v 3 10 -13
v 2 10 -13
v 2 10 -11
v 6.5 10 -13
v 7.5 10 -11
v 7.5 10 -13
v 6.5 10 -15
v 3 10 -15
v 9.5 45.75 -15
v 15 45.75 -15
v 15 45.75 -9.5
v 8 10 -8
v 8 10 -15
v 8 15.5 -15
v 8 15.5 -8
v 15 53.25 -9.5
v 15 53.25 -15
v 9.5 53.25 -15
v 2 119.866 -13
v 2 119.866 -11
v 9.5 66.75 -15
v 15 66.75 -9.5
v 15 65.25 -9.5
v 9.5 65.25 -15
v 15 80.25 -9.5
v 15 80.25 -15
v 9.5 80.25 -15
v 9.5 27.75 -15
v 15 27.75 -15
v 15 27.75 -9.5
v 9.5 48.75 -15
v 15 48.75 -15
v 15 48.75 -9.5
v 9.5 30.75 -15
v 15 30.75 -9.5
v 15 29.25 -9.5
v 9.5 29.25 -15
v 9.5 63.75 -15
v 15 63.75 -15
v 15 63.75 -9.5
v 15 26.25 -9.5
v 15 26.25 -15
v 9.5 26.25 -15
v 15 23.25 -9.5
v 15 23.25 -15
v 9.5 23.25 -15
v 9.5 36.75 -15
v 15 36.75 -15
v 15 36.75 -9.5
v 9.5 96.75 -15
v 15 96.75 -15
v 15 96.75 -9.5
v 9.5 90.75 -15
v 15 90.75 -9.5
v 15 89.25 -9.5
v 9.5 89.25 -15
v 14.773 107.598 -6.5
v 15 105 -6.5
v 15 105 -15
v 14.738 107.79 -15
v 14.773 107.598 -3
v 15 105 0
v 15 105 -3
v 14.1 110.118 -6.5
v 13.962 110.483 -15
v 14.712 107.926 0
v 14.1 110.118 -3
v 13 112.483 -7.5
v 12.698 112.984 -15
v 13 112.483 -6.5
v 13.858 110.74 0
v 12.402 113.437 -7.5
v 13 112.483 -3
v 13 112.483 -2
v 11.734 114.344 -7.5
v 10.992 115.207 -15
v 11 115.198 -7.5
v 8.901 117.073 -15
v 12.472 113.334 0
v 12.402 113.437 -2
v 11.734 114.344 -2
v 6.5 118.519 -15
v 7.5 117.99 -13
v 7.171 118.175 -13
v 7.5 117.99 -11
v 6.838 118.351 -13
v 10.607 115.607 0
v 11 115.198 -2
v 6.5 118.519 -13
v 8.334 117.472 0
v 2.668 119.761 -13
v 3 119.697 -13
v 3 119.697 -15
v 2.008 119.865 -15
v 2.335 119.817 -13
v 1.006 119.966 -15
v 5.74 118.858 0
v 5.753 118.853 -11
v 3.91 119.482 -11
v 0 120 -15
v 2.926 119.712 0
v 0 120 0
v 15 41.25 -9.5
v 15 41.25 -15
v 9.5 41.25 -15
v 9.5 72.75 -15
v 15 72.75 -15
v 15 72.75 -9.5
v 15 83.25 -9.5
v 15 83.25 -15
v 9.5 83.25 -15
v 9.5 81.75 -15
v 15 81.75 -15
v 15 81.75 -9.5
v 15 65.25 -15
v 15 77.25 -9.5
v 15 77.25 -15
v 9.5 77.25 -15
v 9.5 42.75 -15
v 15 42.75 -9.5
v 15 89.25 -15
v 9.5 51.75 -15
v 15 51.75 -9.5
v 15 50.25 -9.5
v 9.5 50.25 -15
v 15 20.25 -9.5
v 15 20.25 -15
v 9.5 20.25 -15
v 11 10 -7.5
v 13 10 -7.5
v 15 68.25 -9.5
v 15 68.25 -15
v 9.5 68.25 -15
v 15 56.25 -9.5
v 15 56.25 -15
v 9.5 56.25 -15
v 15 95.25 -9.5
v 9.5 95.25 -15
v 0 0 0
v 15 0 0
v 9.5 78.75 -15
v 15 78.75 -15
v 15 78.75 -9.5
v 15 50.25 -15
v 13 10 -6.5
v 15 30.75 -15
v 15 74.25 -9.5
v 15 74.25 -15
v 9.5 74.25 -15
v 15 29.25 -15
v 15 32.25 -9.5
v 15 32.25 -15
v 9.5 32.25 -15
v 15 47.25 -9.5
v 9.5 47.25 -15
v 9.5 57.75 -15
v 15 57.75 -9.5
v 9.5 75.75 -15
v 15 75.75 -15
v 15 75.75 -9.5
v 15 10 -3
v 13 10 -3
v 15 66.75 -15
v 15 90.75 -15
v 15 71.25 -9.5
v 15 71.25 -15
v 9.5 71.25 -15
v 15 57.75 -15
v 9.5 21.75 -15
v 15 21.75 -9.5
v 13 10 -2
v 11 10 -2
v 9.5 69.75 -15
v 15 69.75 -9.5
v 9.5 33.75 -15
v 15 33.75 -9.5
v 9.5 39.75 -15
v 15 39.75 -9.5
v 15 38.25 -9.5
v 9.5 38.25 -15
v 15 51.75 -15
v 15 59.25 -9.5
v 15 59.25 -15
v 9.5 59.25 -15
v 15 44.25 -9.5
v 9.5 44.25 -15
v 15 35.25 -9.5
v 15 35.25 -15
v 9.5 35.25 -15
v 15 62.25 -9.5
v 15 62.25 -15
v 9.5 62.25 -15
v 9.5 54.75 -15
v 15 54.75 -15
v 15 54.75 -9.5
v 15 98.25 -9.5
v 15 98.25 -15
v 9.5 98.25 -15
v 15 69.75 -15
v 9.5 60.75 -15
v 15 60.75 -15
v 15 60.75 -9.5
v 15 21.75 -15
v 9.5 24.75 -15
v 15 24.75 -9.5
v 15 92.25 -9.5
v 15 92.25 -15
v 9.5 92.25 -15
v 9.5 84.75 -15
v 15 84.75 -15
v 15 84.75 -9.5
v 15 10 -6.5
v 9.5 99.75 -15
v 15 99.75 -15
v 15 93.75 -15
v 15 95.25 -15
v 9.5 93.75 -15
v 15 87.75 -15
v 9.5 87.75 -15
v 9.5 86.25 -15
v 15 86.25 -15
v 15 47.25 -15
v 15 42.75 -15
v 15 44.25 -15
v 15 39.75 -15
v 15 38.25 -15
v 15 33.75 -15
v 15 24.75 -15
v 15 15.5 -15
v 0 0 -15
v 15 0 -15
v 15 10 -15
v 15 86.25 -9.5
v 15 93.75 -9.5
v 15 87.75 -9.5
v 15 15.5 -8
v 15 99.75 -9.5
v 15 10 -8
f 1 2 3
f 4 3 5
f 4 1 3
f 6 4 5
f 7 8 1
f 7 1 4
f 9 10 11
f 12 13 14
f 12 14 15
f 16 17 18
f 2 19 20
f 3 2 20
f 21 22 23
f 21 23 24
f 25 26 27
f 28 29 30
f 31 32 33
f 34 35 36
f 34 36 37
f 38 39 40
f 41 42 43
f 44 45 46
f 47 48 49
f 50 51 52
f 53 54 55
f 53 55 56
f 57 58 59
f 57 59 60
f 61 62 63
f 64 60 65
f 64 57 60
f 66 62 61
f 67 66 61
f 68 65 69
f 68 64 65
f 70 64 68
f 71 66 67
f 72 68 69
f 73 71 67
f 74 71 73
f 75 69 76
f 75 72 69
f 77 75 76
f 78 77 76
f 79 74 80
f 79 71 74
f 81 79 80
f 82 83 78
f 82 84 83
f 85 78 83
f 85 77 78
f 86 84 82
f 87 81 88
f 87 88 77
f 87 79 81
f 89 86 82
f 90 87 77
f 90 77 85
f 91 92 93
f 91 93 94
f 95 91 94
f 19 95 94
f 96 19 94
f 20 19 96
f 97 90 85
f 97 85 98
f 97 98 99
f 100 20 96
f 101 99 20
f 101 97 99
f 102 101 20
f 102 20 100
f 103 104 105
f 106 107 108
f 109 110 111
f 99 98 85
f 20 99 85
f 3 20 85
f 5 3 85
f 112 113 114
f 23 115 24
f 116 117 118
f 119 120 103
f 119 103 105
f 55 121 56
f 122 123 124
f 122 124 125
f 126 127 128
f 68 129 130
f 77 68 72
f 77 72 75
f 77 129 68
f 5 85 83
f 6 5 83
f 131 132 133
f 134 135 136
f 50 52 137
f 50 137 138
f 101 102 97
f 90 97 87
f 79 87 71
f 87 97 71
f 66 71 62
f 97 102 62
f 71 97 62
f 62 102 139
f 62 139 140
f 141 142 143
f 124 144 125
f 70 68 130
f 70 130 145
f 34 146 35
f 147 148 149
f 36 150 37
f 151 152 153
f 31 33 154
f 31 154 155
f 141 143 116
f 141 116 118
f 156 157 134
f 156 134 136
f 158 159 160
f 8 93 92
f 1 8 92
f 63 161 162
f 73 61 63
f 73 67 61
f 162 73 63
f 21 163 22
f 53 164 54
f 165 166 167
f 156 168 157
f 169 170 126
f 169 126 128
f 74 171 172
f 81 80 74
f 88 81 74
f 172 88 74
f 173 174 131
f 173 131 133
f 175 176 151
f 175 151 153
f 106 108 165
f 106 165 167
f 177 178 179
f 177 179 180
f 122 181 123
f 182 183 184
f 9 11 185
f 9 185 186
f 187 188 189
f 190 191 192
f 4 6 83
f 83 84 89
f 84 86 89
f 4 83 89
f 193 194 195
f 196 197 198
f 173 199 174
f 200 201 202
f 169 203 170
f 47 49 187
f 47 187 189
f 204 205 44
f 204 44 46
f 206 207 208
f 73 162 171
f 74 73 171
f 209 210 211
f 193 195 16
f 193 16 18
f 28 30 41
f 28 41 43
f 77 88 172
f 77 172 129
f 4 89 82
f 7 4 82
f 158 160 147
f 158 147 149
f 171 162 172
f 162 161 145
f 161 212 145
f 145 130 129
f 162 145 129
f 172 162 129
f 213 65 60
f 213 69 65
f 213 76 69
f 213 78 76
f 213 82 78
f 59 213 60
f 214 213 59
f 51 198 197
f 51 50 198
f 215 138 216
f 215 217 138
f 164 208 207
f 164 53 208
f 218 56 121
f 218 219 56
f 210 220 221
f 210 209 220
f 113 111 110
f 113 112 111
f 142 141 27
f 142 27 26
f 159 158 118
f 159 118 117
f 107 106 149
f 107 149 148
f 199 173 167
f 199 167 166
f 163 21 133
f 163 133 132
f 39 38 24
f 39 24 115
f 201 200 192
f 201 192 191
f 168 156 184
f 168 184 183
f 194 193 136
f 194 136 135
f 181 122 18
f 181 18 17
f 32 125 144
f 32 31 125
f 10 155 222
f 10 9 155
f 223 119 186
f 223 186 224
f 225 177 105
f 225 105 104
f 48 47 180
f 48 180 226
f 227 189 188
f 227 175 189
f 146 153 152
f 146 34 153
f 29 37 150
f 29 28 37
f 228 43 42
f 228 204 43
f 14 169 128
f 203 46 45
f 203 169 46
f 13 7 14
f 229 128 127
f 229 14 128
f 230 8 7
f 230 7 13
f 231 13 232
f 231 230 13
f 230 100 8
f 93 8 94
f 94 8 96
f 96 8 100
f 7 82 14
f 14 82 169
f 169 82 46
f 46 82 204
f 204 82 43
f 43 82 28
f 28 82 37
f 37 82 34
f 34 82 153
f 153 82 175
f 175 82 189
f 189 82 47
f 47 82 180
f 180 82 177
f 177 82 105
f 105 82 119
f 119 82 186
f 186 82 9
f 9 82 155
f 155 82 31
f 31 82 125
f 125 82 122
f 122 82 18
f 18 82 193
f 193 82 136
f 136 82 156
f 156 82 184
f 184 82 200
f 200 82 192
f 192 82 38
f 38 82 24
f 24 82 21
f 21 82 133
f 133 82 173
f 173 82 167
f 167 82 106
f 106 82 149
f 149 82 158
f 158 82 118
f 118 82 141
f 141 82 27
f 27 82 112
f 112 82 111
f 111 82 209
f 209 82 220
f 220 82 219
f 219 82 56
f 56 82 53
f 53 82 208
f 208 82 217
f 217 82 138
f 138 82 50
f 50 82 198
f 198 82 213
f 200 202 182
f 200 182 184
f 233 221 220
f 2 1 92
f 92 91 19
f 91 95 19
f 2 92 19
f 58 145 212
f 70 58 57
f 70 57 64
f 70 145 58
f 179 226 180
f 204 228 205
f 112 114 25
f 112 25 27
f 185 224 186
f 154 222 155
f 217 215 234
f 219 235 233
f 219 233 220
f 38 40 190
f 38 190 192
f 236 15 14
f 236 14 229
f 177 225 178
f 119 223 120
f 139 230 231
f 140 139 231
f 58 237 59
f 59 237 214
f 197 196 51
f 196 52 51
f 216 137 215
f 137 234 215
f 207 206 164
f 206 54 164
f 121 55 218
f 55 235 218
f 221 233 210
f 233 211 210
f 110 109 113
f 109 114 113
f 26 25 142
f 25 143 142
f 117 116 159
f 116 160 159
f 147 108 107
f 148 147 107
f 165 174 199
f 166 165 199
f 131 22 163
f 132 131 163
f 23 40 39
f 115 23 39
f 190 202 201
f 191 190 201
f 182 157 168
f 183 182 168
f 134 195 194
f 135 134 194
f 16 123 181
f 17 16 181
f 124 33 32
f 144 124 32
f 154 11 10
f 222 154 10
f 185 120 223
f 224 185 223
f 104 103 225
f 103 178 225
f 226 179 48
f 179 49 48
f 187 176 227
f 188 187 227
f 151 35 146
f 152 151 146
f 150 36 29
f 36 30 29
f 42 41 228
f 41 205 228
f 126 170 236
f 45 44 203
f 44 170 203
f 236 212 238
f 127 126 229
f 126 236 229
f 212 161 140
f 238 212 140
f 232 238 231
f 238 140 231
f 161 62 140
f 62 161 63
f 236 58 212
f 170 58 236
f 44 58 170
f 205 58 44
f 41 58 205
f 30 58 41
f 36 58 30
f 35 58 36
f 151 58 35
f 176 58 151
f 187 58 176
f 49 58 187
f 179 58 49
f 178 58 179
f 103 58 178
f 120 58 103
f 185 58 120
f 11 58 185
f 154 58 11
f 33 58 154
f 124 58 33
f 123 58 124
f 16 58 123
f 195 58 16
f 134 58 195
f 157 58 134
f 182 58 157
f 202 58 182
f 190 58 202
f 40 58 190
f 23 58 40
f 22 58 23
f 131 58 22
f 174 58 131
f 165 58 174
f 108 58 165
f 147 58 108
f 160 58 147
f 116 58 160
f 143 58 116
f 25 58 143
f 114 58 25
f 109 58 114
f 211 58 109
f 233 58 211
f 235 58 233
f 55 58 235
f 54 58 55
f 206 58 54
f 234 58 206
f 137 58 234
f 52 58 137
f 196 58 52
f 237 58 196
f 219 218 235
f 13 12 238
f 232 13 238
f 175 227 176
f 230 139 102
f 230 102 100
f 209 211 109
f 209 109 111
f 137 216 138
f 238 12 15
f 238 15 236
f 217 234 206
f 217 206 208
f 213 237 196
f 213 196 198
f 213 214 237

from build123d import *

# Parameters (mm, degrees)
SKETCH1_W           = 15
SKETCH1_H           = 15
BOSS_EXTRUDE1_DEPTH = 120
CUT_EXTRUDE1_DEPTH  = 110
CUT_EXTRUDE2_START  = -20.25
CUT_EXTRUDE2_DEPTH  = 1.5
LPATTERN1_COUNT     = 27
LPATTERN1_PITCH     = 3
CUT_EXTRUDE3_START  = -10
SKETCH6_W           = 7
SKETCH6_H           = 7
CUT_EXTRUDE3_DEPTH  = 5.5
CUT_EXTRUDE4_DEPTH  = 122.86057607


with BuildPart() as part:
    # Sketch1 → Boss-Extrude1 (new body)
    with BuildSketch(Plane(origin=(0, 0, 0), x_dir=(1, 0, 0), z_dir=(0, 1, 0))):
        with Locations((7.5, 7.5)):
            Rectangle(SKETCH1_W, SKETCH1_H)
    extrude(amount=BOSS_EXTRUDE1_DEPTH)

    # Sketch3 → Cut-Extrude1 (cut)
    with BuildSketch(Plane(origin=(0, 120, 0), x_dir=(1, 0, 0), z_dir=(0, 1, 0))):
        Polygon((15, 3), (13, 3), (13, 2), (11, 2), (11, 7.5), (13, 7.5), (13, 6.5), (15, 6.5), align=None)
        Polygon((3, 13), (2, 13), (2, 11), (7.5, 11), (7.5, 13), (6.5, 13), (6.5, 15), (3, 15), align=None)
    extrude(amount=-CUT_EXTRUDE1_DEPTH, mode=Mode.SUBTRACT)

    # Sketch5 → Cut-Extrude2 (cut)
    with BuildSketch(Plane(origin=(0, 120, 0), x_dir=(1, 0, 0), z_dir=(0, 1, 0)).offset(CUT_EXTRUDE2_START)):
        Polygon((15, 15), (15, 9.5), (9.5, 15), align=None)
    cut_extrude2 = extrude(amount=-CUT_EXTRUDE2_DEPTH, mode=Mode.SUBTRACT)

    # LPattern1: Cut-Extrude2 ×27
    with Locations(*[(0, -i * LPATTERN1_PITCH, 0) for i in range(1, LPATTERN1_COUNT)]):
        add(cut_extrude2, mode=Mode.SUBTRACT)

    # Sketch6 → Cut-Extrude3 (cut)
    with BuildSketch(Plane.XZ.offset(CUT_EXTRUDE3_START)):
        with Locations((11.5, -11.5)):
            Rectangle(SKETCH6_W, SKETCH6_H)
    extrude(amount=-CUT_EXTRUDE3_DEPTH, mode=Mode.SUBTRACT)

    # Sketch12 → Cut-Extrude4 (cut, through all)
    with BuildSketch(Plane.XY):
        with BuildLine():
            Line((0, 120), (15, 120))
            Line((15, 120), (15, 105))
            ThreePointArc((15, 105), (10.606601718, 115.606601718), (0, 120))
        make_face()
    extrude(amount=-CUT_EXTRUDE4_DEPTH, mode=Mode.SUBTRACT)


solid = part.part
